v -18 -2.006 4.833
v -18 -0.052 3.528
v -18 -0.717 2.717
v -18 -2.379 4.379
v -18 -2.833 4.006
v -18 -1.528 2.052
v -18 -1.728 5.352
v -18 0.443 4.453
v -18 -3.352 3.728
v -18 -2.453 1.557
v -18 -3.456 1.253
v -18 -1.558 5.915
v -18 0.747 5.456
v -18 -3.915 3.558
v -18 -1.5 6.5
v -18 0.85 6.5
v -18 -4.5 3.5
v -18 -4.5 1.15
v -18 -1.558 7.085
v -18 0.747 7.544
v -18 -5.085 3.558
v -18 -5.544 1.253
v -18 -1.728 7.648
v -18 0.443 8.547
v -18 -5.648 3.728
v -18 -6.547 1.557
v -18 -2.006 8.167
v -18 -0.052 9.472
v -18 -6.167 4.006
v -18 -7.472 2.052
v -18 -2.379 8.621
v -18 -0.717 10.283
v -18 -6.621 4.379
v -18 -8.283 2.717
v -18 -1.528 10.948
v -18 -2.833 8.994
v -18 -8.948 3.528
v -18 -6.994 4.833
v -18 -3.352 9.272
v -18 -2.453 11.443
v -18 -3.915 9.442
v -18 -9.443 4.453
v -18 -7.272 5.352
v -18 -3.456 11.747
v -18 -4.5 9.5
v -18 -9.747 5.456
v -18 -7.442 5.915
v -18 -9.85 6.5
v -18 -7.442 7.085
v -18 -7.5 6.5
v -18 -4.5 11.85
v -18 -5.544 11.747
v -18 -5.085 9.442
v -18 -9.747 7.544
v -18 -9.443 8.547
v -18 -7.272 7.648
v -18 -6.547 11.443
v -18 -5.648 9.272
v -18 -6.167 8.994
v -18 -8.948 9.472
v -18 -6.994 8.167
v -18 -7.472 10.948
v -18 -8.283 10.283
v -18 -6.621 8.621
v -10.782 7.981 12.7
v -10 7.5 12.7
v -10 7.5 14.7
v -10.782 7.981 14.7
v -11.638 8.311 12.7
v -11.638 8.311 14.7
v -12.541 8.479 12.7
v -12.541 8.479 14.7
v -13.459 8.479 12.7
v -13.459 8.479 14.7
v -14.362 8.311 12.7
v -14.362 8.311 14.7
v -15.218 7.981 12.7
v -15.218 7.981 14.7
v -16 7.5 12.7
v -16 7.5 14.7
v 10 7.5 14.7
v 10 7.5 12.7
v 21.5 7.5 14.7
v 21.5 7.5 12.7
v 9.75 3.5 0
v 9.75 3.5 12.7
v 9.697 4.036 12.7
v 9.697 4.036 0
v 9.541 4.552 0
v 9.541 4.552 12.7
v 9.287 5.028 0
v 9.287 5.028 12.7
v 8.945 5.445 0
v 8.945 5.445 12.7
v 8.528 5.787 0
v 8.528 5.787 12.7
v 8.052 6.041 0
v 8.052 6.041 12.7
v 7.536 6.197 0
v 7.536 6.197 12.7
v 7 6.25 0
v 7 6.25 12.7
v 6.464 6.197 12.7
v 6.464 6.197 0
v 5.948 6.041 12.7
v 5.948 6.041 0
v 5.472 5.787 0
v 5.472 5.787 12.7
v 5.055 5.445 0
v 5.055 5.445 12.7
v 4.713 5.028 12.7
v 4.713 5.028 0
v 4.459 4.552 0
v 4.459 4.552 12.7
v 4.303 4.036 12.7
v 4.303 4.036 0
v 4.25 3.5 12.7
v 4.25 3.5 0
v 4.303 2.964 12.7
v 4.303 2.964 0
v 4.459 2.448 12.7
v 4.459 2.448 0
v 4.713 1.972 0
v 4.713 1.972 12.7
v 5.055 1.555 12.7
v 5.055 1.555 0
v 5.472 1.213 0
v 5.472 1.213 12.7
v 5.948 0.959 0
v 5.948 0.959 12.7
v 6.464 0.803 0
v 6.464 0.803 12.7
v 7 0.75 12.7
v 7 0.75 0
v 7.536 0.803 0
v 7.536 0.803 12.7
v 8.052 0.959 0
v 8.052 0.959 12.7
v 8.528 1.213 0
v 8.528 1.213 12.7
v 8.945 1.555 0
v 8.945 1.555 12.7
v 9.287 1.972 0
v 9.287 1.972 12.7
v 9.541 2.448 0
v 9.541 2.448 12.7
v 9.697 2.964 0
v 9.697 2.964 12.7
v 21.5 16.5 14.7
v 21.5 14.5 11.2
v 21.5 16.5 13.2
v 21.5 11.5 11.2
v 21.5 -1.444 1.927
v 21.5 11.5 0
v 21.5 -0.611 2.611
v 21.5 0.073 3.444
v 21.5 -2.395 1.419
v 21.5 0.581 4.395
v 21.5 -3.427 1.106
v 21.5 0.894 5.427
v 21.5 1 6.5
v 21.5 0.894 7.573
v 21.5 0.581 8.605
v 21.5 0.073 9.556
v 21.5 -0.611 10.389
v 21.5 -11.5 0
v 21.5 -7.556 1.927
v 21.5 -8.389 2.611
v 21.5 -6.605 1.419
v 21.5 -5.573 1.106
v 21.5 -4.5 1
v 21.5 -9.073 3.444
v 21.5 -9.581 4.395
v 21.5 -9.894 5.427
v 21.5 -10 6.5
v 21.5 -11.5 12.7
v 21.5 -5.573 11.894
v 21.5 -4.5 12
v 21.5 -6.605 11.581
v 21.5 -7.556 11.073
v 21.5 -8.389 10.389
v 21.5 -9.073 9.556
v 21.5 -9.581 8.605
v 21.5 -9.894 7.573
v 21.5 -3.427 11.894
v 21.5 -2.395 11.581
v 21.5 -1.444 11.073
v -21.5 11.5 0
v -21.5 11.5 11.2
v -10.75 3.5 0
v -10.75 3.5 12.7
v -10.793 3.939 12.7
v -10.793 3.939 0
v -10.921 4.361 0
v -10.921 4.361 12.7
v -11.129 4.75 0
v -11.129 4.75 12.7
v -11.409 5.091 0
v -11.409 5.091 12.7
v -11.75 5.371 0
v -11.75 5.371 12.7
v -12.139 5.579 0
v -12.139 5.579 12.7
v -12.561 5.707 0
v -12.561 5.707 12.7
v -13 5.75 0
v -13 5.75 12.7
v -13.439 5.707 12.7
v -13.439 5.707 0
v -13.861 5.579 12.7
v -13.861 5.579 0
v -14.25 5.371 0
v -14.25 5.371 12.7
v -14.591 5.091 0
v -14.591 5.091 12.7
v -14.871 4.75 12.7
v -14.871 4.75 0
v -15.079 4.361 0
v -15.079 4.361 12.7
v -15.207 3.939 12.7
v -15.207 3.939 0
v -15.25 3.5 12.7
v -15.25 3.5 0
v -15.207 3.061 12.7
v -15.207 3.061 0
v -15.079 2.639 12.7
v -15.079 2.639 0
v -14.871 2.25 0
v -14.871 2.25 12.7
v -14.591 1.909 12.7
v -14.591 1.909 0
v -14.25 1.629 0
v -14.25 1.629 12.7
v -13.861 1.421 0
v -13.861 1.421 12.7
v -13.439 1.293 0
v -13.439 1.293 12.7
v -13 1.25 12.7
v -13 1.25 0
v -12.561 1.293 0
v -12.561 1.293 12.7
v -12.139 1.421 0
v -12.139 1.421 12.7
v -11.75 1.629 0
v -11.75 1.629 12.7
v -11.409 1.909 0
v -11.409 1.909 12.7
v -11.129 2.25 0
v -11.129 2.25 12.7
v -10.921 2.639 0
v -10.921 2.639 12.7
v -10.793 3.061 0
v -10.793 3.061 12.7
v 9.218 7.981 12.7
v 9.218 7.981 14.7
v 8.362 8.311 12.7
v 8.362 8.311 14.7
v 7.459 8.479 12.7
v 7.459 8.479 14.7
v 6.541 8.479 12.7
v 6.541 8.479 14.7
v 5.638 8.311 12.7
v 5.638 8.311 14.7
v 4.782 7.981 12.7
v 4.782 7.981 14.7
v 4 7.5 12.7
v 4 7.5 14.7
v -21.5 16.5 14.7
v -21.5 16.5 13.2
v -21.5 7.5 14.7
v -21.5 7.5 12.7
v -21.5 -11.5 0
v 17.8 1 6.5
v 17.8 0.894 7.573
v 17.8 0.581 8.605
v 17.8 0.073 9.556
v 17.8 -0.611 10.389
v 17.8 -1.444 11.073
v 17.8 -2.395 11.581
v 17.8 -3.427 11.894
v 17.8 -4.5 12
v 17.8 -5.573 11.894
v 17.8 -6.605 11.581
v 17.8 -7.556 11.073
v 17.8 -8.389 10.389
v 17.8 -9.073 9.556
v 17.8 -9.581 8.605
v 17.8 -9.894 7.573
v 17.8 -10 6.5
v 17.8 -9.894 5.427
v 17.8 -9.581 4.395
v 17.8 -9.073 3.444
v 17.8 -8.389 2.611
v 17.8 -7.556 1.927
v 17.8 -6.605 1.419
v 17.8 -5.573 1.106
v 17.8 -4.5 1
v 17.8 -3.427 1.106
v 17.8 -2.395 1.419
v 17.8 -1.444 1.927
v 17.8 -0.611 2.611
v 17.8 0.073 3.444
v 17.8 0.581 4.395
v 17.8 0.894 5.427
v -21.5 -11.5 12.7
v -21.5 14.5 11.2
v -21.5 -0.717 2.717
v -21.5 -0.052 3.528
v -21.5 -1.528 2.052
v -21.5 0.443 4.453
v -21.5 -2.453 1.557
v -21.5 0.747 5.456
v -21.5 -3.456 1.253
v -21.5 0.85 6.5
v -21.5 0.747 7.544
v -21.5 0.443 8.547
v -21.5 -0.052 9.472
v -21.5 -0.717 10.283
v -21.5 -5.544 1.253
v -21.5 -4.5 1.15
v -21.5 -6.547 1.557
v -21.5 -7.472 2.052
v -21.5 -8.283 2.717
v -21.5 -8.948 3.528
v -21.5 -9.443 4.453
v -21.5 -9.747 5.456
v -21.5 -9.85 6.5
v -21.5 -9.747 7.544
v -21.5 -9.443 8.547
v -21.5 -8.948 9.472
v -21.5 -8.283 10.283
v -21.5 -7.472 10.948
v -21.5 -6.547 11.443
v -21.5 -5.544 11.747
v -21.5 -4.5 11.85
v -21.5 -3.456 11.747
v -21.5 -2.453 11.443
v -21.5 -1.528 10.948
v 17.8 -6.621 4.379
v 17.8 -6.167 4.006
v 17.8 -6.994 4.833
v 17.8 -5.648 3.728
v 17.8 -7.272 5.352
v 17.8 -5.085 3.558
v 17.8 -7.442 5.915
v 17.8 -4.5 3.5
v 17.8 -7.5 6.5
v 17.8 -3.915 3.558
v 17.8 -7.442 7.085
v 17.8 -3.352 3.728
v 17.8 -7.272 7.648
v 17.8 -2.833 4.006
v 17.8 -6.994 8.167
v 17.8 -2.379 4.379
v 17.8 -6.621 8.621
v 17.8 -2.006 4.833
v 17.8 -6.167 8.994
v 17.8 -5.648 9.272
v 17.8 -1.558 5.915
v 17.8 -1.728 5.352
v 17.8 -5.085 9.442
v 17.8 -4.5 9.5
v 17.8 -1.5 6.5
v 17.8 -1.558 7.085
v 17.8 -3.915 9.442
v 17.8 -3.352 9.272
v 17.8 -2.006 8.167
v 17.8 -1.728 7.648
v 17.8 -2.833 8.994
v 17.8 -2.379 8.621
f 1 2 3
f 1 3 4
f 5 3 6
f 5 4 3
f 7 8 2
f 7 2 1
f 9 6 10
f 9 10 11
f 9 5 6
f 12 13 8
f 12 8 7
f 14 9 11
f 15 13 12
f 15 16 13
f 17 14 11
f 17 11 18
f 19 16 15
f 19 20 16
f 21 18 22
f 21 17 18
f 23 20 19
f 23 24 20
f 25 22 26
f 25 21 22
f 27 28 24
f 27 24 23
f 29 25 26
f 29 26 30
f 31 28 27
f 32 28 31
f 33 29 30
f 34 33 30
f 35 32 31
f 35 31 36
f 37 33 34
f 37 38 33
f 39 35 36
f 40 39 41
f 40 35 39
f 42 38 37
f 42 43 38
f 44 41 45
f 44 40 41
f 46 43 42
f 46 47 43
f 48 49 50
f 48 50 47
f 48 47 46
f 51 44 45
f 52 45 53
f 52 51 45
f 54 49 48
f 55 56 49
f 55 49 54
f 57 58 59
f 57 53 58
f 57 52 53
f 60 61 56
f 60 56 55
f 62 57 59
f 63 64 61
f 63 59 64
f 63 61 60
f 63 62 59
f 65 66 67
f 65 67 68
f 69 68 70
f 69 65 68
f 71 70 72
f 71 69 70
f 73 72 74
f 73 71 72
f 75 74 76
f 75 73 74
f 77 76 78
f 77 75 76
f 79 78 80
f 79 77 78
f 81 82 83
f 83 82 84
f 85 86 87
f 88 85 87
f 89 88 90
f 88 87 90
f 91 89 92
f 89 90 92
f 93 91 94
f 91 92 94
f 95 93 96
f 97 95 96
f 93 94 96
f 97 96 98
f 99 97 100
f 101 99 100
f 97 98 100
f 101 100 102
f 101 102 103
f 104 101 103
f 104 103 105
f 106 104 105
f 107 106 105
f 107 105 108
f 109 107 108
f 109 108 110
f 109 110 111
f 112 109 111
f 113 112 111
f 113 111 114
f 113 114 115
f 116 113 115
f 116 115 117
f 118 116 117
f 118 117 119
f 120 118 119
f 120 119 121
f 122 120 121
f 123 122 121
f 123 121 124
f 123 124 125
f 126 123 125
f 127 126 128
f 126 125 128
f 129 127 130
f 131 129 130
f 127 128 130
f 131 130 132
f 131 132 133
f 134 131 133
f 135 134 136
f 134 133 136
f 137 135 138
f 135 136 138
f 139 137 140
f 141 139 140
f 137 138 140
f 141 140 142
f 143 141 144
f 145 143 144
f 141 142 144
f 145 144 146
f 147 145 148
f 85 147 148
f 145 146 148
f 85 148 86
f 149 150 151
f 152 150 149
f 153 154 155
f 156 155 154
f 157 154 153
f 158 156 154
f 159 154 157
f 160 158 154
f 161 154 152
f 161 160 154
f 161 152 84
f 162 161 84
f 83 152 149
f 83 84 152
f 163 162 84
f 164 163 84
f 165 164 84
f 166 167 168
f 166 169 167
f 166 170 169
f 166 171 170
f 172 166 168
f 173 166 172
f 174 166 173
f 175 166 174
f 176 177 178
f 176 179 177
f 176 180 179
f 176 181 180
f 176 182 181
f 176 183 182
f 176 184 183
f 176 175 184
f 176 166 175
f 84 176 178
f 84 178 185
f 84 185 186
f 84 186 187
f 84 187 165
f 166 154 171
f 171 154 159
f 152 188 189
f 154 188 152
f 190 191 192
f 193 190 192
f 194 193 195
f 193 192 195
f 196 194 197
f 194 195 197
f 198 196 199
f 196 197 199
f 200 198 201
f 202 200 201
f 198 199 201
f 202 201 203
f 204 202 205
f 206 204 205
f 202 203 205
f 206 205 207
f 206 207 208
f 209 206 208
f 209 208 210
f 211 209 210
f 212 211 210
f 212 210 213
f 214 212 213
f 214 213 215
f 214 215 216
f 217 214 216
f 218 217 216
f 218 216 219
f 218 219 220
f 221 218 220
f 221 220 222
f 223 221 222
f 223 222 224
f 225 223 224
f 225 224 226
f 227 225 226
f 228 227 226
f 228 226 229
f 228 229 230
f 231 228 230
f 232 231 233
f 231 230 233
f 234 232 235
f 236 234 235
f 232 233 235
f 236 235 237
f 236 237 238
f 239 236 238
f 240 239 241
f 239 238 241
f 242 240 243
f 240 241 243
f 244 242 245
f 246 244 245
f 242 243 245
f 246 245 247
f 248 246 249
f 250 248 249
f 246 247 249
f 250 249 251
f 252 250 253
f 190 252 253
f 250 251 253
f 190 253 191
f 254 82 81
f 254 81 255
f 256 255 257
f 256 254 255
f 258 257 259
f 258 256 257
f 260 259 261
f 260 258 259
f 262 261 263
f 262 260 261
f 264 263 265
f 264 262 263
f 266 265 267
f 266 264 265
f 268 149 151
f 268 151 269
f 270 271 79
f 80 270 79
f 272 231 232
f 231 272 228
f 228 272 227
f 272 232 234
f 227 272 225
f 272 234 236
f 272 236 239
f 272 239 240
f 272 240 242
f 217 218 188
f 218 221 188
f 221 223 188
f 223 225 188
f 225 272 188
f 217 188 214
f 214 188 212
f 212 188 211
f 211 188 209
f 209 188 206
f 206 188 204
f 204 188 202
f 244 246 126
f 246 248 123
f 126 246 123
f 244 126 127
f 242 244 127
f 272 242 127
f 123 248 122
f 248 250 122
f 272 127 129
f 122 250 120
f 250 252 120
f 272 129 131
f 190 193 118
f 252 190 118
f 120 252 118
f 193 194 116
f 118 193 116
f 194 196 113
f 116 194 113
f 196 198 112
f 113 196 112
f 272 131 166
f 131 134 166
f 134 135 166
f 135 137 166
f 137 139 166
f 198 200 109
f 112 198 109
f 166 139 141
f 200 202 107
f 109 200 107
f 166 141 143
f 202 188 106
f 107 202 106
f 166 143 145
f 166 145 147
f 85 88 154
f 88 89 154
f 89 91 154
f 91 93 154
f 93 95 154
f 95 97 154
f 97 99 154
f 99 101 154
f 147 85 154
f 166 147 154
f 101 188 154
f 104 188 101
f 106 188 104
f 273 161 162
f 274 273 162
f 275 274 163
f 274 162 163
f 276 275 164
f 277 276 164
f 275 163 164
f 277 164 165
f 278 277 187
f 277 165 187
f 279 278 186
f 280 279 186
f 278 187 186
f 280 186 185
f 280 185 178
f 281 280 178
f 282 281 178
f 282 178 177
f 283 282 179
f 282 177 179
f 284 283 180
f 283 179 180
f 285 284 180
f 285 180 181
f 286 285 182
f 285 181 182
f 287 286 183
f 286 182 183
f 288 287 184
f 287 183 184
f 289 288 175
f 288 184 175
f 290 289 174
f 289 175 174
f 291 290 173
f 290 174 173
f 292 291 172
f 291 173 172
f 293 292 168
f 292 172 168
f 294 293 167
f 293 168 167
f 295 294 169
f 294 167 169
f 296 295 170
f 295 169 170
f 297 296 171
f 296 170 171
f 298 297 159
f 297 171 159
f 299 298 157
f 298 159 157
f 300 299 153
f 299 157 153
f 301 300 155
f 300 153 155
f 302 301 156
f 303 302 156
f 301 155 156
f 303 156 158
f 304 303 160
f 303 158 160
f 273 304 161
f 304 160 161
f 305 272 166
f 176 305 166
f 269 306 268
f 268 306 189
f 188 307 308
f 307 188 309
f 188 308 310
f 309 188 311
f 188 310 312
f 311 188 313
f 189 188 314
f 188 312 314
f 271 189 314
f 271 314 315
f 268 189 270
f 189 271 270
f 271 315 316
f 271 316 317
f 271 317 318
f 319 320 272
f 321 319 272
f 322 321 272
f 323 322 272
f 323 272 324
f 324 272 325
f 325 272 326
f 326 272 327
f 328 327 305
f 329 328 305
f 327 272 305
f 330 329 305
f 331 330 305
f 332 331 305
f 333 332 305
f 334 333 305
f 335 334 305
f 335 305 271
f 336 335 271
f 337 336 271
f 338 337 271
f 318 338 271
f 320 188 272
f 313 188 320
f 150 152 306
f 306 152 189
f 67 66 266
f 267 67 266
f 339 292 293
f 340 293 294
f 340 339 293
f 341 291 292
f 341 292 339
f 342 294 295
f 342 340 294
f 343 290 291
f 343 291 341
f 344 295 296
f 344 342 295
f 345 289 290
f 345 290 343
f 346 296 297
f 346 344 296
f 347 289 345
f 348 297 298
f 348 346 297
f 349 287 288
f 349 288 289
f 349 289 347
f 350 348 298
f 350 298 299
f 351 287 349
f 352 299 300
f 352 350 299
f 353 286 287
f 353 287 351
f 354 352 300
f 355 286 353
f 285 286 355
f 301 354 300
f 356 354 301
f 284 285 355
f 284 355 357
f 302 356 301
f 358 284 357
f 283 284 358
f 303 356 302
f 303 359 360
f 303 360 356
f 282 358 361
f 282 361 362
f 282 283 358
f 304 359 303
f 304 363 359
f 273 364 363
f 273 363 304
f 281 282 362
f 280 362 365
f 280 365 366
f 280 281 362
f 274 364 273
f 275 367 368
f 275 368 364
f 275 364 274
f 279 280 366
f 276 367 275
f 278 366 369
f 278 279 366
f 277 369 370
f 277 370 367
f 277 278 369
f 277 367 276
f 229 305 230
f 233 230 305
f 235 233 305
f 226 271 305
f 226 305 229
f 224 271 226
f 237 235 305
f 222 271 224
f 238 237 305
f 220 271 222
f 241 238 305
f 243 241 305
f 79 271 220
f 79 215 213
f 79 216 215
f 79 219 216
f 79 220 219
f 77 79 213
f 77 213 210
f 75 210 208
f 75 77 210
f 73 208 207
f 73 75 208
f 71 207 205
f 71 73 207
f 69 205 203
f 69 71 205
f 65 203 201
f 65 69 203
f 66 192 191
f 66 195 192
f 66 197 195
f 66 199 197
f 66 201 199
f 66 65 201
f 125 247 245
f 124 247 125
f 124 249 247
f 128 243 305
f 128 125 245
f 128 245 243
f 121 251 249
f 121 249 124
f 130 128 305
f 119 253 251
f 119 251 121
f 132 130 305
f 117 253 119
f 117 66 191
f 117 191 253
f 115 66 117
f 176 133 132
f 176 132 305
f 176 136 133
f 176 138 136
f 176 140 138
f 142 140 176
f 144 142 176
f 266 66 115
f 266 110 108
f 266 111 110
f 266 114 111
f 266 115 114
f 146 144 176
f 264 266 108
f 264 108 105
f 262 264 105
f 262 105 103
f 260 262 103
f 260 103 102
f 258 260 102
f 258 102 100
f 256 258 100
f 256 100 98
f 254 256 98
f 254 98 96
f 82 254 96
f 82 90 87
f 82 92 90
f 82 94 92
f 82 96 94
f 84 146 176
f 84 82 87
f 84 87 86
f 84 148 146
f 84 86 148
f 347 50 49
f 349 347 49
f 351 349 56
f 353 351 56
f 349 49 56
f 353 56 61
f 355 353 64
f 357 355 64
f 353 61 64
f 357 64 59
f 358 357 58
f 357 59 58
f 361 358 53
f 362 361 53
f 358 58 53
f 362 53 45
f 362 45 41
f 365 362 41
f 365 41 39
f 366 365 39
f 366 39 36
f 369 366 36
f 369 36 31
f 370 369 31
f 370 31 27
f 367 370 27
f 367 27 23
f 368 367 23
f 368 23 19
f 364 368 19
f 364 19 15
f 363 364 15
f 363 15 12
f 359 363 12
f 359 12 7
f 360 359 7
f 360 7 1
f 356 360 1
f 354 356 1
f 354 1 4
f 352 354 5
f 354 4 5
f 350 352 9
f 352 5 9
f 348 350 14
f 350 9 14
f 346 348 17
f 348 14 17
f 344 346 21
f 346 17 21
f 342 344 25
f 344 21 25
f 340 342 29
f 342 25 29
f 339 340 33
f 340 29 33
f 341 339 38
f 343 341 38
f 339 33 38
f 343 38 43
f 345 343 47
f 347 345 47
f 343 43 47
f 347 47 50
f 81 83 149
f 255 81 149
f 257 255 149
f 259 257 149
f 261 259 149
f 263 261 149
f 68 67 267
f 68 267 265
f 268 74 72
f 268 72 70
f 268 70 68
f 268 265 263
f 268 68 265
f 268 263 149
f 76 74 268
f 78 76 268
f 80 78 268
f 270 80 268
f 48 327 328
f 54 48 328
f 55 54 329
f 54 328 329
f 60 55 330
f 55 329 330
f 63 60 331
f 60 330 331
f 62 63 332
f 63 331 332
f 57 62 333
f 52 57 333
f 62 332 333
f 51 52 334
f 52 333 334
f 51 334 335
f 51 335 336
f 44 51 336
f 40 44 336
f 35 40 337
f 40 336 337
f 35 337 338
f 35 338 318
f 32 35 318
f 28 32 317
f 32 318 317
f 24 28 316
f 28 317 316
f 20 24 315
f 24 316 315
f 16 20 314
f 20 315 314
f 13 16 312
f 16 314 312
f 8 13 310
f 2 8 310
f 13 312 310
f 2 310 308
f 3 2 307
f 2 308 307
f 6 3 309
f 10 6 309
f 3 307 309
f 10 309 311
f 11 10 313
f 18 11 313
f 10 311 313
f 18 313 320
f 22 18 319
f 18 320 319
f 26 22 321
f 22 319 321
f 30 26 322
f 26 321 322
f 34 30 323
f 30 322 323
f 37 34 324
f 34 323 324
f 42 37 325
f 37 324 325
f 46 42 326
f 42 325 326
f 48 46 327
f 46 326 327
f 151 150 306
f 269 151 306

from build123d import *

# Parameters (mm, degrees)
F0_W      = 43
F0_H      = 23
F1_DEPTH  = 12.7
F2_R      = 2.75
F2_R_2    = 2.25
F3_DEPTH  = 25.4
F4_R      = 3
F5_DEPTH  = 50.8
F6_R      = 5.35
F7_DEPTH  = 3.5
F8_R      = 5.5
F9_DEPTH  = 3.7
F10_W     = 43
F10_H     = 4
F11_DEPTH = 2
F12_W     = 43
F12_H     = 3.5
F13_DEPTH = 5
F14_SIZE  = 2
F15_R     = 5
F16_DEPTH = 25


with BuildPart() as f1:
    # F0 (on Top) → F1 (new body)
    with BuildSketch(Plane.XY):
        Rectangle(F0_W, F0_H)
    extrude(amount=F1_DEPTH)

    # F2 (on face) → F3 (cut)
    with BuildSketch(Plane.XY.offset(12.7)):
        with Locations((7, 3.5)):
            Circle(F2_R)
        with Locations((-13, 3.5)):
            Circle(F2_R_2)
    extrude(amount=-F3_DEPTH, mode=Mode.SUBTRACT)

    # F4 (on face) → F5 (cut)
    with BuildSketch(Plane(origin=(-21.5, 0, 0), x_dir=(0, -1, 0), z_dir=(-1, 0, 0))):
        with Locations((4.5, 6.5)):
            Circle(F4_R)
    extrude(amount=-F5_DEPTH, mode=Mode.SUBTRACT)

    # F6 (on face) → F7 (cut)
    with BuildSketch(Plane(origin=(-21.5, 0, 0), x_dir=(0, -1, 0), z_dir=(-1, 0, 0))):
        with Locations((4.5, 6.5)):
            Circle(F6_R)
    extrude(amount=-F7_DEPTH, mode=Mode.SUBTRACT)

    # F8 (on face) → F9 (cut)
    with BuildSketch(Plane.YZ.offset(21.5)):
        with Locations((-4.5, 6.5)):
            Circle(F8_R)
    extrude(amount=-F9_DEPTH, mode=Mode.SUBTRACT)

    # F10 (on face) → F11 (join)
    with BuildSketch(Plane.XY.offset(12.7)):
        with Locations((0, 9.5)):
            Rectangle(F10_W, F10_H)
    extrude(amount=F11_DEPTH)

    # F12 (on face) → F13 (join)
    with BuildSketch(Plane(origin=(0, 11.5, 0), x_dir=(-1, 0, 0), z_dir=(0, 1, 0))):
        with Locations((0, 12.95)):
            Rectangle(F12_W, F12_H)
    extrude(amount=F13_DEPTH)

    # F14
    f14_edges = [f1.edges().sort_by_distance(p)[0] for p in [
        (0, 16.5, 11.2),
    ]]
    chamfer(f14_edges, length=F14_SIZE)

    # F15 (on face) → F16 (cut)
    with BuildSketch(Plane.XY.offset(12.7)):
        with Locations((-13, 3.5)):
            Circle(F15_R)
        with Locations((7, 3.5)):
            Circle(F15_R)
    extrude(amount=F16_DEPTH, mode=Mode.SUBTRACT)


solid = f1.part
